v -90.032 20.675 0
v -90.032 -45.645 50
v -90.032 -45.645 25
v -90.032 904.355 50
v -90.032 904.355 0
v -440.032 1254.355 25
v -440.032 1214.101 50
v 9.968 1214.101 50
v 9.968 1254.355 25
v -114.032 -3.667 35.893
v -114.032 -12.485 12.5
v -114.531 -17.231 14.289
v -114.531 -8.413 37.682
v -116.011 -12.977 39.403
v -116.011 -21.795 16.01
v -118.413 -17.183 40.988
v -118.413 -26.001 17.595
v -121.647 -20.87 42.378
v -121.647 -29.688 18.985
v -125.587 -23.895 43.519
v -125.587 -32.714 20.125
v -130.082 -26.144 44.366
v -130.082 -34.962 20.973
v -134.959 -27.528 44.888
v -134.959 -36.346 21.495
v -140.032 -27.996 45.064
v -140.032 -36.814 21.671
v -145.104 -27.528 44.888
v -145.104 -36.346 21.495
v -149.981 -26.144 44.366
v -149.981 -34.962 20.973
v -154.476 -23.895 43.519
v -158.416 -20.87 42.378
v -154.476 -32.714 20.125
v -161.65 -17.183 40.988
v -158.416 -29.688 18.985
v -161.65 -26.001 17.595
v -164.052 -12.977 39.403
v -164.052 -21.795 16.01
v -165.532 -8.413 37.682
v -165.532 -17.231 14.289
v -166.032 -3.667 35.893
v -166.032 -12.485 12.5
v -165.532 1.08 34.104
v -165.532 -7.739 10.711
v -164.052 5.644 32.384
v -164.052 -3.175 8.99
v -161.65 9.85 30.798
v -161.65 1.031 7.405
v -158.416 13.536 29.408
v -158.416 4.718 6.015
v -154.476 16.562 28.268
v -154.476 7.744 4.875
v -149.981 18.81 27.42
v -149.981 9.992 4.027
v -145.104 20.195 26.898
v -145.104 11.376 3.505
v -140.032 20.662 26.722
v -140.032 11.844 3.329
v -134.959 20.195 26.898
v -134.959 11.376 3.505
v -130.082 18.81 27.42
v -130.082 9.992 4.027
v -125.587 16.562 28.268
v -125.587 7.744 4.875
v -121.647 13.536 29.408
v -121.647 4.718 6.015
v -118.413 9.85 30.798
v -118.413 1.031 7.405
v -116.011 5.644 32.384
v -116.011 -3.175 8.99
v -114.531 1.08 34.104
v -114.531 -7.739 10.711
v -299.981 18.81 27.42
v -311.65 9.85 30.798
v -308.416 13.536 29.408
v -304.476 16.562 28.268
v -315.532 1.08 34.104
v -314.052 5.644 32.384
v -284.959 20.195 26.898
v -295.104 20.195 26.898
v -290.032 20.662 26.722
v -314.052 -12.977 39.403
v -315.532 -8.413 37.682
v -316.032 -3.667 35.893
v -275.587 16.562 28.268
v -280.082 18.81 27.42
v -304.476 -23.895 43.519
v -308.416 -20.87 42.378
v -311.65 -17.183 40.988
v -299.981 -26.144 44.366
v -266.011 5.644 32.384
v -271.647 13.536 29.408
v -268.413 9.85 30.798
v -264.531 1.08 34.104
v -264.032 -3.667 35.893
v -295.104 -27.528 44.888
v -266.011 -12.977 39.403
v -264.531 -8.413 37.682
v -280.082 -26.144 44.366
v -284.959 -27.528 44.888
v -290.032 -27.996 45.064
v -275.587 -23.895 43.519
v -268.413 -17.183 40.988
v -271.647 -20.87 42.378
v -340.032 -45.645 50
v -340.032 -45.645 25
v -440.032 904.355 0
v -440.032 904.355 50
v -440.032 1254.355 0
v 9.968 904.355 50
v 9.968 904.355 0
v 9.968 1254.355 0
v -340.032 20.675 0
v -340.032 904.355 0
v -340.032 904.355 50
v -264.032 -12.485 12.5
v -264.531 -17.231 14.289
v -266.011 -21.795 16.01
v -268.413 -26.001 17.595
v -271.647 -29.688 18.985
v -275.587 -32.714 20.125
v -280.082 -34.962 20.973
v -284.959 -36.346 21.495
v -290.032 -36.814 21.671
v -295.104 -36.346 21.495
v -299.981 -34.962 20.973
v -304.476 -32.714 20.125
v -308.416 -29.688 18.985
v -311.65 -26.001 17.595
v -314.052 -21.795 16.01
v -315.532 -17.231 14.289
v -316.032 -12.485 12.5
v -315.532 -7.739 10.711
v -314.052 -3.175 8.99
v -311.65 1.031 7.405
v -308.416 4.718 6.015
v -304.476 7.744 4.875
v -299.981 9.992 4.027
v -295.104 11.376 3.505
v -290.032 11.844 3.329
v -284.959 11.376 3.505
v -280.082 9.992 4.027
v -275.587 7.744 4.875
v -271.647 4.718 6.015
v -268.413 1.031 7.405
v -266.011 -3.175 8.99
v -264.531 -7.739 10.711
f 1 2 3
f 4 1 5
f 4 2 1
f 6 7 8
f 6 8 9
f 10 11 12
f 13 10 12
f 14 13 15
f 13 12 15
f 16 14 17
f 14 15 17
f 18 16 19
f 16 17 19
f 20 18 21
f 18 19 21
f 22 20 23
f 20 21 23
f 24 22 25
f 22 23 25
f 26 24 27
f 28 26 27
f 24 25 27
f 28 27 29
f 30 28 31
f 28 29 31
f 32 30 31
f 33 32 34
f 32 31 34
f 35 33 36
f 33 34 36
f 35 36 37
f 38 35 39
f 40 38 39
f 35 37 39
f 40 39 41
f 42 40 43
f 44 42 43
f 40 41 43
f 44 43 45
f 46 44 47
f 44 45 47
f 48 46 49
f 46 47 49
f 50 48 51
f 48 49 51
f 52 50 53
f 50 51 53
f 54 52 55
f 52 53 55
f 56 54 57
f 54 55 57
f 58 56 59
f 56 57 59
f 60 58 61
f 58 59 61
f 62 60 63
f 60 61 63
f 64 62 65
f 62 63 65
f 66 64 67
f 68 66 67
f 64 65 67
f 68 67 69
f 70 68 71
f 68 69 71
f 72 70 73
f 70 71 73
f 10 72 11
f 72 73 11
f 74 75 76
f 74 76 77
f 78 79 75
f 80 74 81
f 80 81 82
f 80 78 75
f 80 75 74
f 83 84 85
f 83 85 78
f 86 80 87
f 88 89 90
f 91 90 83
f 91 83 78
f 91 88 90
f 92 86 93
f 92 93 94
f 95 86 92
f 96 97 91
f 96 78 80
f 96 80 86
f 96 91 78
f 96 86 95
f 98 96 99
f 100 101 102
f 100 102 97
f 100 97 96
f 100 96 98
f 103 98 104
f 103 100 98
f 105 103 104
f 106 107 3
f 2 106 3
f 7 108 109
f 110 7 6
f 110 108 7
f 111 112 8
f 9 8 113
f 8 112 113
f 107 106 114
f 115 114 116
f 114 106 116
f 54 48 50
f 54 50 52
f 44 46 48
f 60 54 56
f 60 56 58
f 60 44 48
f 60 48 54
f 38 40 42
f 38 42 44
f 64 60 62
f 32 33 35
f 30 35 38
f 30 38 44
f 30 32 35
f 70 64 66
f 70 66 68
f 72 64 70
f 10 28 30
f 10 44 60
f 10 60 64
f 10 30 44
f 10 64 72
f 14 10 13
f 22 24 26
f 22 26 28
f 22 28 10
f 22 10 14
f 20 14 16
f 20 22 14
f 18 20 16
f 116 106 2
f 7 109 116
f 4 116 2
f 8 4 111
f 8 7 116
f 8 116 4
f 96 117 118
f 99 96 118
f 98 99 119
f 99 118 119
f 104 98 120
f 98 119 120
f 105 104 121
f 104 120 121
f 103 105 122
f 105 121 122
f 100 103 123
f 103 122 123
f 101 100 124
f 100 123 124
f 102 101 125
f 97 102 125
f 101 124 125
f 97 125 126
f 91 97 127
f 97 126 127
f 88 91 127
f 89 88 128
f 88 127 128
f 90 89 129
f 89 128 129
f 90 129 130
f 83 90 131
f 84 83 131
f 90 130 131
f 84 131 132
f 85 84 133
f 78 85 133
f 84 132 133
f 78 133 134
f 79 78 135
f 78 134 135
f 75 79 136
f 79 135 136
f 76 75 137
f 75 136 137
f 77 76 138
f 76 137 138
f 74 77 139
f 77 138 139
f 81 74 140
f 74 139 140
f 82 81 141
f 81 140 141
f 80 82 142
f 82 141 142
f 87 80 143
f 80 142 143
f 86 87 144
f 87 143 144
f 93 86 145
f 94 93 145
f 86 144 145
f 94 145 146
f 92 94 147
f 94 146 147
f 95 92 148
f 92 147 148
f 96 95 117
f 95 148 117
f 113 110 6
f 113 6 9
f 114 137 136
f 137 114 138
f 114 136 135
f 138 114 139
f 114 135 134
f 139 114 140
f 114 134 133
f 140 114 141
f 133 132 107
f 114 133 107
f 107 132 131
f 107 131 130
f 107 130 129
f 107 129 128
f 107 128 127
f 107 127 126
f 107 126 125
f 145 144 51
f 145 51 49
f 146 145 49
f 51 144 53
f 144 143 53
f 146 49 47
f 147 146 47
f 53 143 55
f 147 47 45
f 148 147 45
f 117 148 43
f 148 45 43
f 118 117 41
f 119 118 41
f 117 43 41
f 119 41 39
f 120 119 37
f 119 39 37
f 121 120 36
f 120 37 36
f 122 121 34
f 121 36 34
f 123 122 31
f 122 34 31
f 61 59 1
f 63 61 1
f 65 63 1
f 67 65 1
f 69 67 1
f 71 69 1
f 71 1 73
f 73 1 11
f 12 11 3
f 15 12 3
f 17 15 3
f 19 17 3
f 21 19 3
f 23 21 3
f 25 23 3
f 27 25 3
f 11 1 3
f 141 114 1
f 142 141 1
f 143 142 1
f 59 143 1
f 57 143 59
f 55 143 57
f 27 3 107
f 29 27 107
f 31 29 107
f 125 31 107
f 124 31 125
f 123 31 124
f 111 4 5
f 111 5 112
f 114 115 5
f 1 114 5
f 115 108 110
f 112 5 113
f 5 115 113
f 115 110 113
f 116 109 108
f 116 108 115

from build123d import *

# Parameters (mm, degrees)
F0_W     = 450
F0_H     = 1300
F1_DEPTH = 50
F2_W     = 100
F2_H     = 950
F3_DEPTH = 50.001
F5_DEPTH = 350.001
F7_DEPTH = 450.001
F8_R     = 26
F9_DEPTH = 25


with BuildPart() as f1:
    # F0 (on Top) → F1 (new body)
    with BuildSketch(Plane.XY):
        with Locations((-215.0315403938, 604.3549530208)):
            Rectangle(F0_W, F0_H)
    extrude(amount=F1_DEPTH)

    # F2 (on face) → F3 (cut, through all)
    with BuildSketch(Plane.XY.offset(50)):
        with Locations((-390.0315403938, 429.3549530208)):
            Rectangle(F2_W, F2_H)
        with Locations((-40.0315403938, 429.3549530208)):
            Rectangle(F2_W, F2_H)
    extrude(amount=-F3_DEPTH, mode=Mode.SUBTRACT)

    # F4 (on face) → F5 (cut, through all)
    with BuildSketch(Plane.YZ.offset(-90.0315403938)):
        Polygon((20.675143227, 0), (-45.6450469792, 25), (-45.6450469792, 0), align=None)
    extrude(amount=-F5_DEPTH, mode=Mode.SUBTRACT)

    # F6 (on face) → F7 (cut, through all)
    with BuildSketch(Plane.YZ.offset(9.9684596062)):
        Polygon((1214.1013145447, 50), (1254.3549530208, 25), (1254.3549530208, 50), align=None)
    extrude(amount=-F7_DEPTH, mode=Mode.SUBTRACT)

    # F8 (on face) → F9 (cut)
    with BuildSketch(Plane(origin=(0, 2.5723708618, 6.8240049934), x_dir=(1, 0, 0), z_dir=(0, -0.3527301048, -0.9357251056))):
        with Locations((-140.0315403938, 16.0916092218)):
            Circle(F8_R)
        with Locations((-290.0315403938, 16.0916092218)):
            Circle(F8_R)
    extrude(amount=-F9_DEPTH, mode=Mode.SUBTRACT)


solid = f1.part
